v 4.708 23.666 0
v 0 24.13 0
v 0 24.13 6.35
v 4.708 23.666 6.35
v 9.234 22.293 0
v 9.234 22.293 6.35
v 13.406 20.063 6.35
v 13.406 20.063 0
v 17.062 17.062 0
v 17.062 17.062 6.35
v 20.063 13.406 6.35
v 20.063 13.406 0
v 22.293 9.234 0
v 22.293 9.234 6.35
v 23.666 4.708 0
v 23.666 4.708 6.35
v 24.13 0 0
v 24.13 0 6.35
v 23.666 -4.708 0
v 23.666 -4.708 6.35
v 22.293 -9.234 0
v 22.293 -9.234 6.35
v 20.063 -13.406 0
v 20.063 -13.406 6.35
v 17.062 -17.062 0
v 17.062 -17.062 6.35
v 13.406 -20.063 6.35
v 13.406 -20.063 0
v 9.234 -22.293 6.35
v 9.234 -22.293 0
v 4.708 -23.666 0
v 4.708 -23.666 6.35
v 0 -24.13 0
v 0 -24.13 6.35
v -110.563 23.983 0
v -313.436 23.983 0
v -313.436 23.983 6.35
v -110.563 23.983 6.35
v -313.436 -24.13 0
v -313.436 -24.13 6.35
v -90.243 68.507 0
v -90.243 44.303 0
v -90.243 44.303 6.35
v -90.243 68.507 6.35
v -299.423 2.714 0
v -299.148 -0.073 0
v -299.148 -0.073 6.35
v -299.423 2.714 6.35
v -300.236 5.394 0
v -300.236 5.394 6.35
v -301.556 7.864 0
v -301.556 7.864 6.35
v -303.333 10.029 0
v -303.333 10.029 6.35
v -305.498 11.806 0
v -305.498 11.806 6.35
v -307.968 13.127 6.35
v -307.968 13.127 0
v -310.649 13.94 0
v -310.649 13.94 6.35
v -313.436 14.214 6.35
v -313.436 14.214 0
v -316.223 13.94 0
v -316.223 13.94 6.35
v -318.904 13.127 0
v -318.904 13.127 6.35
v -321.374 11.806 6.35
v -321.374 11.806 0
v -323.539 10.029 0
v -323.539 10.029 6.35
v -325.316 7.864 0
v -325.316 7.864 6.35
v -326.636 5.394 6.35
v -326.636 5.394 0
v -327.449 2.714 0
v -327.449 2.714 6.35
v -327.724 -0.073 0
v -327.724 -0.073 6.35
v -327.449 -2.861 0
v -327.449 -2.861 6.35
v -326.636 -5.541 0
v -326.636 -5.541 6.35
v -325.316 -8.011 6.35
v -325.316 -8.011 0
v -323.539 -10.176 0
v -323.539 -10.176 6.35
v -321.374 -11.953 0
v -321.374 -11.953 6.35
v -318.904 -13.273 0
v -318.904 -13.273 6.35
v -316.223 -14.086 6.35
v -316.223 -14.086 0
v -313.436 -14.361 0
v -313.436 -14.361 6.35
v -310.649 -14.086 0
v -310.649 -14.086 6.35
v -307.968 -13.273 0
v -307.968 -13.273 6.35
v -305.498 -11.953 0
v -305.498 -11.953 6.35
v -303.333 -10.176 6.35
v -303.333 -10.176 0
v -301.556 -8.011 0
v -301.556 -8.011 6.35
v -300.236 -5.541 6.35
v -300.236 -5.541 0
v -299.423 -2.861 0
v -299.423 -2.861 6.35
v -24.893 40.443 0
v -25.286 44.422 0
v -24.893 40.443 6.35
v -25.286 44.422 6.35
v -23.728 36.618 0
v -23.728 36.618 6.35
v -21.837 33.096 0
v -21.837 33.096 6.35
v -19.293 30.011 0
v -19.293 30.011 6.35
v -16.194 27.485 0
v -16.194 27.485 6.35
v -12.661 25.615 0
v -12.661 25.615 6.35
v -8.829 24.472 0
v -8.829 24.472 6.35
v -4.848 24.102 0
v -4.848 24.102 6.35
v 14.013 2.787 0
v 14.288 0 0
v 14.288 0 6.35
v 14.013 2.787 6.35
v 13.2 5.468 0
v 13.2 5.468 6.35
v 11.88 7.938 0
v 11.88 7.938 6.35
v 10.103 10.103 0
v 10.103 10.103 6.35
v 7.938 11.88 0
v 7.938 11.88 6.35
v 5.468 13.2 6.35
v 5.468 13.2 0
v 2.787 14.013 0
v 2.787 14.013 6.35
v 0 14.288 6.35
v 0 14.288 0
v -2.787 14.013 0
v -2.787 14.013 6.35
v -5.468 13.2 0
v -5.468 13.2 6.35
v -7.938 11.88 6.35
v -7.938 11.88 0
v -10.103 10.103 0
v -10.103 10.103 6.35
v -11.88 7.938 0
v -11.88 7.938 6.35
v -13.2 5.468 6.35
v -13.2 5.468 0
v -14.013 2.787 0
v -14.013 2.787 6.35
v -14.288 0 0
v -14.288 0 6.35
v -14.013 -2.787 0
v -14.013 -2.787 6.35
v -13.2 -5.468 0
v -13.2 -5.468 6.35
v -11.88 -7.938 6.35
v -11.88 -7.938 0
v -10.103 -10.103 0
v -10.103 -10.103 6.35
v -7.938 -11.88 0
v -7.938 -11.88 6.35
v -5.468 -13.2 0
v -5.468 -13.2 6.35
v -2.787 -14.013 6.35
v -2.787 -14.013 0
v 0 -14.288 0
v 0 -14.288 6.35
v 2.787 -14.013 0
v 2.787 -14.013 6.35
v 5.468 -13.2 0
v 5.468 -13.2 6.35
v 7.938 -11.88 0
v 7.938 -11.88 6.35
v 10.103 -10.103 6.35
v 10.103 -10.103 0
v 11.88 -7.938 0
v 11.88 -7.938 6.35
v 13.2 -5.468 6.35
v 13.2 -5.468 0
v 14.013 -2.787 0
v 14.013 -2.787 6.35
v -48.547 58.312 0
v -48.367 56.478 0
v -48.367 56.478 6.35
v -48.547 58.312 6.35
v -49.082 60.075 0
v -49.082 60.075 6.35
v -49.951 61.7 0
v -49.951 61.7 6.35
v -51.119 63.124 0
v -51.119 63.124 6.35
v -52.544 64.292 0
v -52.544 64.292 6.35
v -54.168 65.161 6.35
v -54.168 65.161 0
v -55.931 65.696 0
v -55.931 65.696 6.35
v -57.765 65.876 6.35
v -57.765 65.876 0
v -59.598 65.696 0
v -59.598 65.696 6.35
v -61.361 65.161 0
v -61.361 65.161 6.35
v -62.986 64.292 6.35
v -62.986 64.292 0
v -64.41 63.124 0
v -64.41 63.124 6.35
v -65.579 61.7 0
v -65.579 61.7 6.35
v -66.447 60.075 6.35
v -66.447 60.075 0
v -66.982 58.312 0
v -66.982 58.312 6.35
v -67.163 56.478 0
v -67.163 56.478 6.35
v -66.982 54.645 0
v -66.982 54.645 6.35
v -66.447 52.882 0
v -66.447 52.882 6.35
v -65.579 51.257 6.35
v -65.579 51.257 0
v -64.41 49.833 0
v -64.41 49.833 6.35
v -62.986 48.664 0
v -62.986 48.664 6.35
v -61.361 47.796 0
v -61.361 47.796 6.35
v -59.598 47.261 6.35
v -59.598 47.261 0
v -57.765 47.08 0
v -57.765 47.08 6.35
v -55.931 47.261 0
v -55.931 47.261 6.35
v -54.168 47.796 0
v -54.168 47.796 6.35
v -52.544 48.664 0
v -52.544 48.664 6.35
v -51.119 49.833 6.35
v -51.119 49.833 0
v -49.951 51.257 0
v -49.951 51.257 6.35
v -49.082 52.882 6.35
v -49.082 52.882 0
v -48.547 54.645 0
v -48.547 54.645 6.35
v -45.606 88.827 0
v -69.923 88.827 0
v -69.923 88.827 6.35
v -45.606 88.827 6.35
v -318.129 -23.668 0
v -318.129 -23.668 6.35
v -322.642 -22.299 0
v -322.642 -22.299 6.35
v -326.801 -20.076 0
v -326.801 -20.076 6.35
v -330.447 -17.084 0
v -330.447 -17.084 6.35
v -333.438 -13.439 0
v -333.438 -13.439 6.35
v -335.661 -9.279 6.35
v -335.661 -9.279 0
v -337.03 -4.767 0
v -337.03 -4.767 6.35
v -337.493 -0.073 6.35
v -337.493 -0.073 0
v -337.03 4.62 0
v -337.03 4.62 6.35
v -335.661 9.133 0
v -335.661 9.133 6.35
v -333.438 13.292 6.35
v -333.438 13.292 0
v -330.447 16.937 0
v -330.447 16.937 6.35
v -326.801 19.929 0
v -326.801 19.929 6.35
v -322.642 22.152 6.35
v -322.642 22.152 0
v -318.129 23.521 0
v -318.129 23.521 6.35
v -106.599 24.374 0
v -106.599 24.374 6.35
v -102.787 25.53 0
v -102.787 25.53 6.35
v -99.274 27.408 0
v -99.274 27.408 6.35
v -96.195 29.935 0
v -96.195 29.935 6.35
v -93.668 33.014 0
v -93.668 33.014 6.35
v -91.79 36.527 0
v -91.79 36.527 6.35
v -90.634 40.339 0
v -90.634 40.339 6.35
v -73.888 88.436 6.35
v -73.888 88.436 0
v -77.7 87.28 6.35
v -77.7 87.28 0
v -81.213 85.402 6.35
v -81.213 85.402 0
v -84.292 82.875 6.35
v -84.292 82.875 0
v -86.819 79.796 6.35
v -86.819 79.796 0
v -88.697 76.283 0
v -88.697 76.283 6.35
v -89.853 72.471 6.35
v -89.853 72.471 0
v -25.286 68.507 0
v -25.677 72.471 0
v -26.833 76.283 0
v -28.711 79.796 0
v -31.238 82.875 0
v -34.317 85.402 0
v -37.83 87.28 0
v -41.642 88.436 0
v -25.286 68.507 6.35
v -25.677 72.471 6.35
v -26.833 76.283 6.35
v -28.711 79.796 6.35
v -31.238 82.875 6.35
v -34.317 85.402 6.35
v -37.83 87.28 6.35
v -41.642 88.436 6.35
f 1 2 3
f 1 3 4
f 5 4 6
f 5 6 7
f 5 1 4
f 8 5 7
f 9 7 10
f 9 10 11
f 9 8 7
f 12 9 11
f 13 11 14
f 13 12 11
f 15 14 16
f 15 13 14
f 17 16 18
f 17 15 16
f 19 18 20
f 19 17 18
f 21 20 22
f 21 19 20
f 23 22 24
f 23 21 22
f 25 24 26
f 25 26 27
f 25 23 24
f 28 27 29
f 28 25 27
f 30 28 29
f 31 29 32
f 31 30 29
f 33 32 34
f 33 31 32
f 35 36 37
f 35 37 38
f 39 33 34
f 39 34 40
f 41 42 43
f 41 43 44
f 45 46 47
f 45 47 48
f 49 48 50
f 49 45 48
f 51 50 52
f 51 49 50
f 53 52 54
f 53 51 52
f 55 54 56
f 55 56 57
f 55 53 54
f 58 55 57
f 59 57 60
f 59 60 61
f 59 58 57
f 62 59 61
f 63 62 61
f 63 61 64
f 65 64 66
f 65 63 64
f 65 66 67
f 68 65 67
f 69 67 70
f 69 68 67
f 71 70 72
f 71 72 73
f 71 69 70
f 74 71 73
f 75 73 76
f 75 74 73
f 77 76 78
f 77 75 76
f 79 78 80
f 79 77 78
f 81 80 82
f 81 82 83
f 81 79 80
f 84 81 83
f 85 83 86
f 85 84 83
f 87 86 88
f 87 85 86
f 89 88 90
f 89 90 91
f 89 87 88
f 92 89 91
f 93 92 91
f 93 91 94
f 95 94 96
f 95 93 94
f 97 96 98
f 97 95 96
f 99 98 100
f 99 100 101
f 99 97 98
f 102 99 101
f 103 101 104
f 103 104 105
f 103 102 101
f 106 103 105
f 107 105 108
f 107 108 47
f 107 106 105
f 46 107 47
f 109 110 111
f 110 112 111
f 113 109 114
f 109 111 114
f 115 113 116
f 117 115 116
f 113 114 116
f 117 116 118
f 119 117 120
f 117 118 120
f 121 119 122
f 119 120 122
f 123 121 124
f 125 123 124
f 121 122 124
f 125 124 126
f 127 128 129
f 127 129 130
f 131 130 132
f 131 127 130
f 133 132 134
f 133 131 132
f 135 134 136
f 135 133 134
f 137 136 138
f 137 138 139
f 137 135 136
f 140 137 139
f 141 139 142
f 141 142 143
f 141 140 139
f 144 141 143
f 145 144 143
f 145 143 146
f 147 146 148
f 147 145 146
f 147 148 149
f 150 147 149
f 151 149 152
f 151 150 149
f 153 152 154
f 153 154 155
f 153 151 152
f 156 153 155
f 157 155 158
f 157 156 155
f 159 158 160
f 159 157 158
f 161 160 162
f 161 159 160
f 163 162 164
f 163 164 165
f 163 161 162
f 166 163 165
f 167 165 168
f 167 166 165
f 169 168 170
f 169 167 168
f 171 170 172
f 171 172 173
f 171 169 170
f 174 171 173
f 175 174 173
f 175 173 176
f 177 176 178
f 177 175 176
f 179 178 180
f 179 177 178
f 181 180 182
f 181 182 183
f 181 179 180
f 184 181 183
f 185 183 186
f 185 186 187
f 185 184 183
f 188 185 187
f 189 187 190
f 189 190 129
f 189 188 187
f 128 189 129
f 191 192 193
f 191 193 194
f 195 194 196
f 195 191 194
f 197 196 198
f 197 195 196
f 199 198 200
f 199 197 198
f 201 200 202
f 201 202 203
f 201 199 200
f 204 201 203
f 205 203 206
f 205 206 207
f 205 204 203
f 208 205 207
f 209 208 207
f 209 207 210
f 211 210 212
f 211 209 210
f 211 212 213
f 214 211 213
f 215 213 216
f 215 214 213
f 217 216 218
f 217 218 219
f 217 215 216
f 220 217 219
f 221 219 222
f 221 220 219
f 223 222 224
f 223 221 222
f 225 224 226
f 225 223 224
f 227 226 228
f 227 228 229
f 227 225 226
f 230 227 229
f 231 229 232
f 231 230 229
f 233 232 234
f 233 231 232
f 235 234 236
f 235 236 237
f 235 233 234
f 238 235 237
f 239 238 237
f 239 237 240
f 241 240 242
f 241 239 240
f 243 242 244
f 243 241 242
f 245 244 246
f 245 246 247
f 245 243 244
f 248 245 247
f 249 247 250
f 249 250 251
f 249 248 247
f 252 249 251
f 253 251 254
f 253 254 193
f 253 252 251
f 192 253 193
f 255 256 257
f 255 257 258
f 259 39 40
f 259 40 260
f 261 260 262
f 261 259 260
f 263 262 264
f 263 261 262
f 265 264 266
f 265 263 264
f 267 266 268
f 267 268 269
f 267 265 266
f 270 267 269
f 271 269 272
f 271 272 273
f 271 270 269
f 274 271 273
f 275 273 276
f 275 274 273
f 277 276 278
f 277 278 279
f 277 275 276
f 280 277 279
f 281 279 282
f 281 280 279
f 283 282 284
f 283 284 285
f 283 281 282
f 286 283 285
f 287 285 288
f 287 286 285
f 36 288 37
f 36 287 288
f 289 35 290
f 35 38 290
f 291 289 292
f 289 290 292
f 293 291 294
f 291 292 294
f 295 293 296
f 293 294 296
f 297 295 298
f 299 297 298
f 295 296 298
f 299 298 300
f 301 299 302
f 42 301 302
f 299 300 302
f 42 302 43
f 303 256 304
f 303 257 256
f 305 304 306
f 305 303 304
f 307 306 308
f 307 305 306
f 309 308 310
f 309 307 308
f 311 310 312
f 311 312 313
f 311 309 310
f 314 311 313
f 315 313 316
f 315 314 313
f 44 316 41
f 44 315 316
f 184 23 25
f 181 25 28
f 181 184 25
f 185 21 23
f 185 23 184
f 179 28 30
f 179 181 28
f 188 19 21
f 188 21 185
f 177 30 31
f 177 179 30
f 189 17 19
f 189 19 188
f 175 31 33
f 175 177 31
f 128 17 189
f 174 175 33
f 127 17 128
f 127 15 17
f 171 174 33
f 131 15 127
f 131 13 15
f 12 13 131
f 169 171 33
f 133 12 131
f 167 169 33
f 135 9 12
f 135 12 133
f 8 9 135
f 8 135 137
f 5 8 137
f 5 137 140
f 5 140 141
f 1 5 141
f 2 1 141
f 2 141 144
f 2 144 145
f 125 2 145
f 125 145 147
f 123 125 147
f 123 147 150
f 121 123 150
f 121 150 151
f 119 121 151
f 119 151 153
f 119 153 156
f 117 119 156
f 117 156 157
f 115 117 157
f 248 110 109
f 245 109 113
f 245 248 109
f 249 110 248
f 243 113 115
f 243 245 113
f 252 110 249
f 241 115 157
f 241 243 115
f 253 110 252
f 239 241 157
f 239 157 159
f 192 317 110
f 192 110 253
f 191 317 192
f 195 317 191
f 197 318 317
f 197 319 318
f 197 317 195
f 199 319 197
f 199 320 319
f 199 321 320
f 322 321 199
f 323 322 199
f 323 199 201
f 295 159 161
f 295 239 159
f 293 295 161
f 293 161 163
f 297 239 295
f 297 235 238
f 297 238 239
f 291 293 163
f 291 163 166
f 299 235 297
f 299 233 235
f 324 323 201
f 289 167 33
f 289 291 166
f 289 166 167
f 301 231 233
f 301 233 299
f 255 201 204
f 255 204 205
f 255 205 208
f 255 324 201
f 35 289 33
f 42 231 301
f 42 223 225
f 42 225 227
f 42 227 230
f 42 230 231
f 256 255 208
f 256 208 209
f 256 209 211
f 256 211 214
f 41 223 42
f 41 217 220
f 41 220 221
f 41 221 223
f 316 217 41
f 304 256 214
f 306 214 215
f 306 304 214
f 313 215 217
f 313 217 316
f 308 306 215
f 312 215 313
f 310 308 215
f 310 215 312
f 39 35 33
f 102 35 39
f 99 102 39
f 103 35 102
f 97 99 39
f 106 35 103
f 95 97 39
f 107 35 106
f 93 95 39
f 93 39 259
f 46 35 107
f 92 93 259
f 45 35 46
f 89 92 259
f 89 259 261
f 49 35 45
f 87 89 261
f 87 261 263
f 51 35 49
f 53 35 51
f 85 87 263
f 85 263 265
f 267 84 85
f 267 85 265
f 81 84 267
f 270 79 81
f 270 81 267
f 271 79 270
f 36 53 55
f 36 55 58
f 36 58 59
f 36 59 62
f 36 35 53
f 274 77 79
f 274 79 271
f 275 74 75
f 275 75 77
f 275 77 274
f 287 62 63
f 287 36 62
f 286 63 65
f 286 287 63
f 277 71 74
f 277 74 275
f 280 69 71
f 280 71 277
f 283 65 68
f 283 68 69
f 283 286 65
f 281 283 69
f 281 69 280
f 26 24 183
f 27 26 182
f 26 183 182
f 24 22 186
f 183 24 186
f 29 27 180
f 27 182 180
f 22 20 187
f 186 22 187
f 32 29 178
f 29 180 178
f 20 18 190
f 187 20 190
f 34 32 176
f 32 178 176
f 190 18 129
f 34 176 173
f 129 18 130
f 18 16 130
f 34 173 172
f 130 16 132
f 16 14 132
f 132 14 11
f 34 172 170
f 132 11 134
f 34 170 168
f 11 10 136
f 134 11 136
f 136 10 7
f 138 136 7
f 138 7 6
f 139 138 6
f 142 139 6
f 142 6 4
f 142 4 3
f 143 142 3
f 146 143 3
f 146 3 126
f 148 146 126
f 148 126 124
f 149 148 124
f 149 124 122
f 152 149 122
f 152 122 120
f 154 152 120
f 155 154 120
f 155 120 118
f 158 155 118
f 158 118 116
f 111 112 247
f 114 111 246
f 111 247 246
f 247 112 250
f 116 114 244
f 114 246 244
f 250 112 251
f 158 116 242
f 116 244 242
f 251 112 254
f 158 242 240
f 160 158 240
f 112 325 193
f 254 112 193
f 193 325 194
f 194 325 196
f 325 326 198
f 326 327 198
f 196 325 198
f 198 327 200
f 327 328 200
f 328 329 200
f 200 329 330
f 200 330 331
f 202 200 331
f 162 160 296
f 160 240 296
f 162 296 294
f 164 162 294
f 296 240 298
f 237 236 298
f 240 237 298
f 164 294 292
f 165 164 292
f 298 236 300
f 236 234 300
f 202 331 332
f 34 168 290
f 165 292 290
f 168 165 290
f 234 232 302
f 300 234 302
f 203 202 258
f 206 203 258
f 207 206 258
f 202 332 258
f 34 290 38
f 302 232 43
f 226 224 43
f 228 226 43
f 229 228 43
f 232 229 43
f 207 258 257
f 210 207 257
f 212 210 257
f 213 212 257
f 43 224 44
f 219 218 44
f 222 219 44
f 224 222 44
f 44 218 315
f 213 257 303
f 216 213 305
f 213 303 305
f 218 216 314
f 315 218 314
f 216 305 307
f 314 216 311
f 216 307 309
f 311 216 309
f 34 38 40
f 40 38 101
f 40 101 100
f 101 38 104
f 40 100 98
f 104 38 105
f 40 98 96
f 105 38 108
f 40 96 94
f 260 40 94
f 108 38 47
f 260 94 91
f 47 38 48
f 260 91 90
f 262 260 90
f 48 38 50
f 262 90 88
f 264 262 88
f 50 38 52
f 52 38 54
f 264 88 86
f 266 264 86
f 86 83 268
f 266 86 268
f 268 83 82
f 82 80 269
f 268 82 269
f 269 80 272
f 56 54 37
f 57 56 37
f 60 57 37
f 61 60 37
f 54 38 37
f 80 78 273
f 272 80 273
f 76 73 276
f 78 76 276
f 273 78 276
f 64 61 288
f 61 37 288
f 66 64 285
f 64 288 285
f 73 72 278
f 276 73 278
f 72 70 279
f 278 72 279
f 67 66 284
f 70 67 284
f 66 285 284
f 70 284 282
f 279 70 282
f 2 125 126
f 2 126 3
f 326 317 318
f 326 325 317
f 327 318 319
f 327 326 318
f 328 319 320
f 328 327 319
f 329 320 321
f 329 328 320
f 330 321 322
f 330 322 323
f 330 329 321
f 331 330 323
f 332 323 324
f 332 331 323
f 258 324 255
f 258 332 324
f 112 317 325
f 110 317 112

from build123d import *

# Parameters (mm, degrees)
SKETCH1_R           = 14.2875
SKETCH1_R_2         = 9.398
BOSS_EXTRUDE1_DEPTH = 6.35
FILLET1_R           = 20.32
FILLET4_R           = 20.32
FILLET5_R           = 20.32
FILLET6_R           = 20.32


with BuildPart() as part:
    # Sketch1 → Boss-Extrude1 (new body)
    with BuildSketch(Plane.XY):
        with BuildLine():
            Line((0, -24.13), (-313.436, -24.13))
            ThreePointArc((-313.436, -24.13), (-337.49260416, -0.07339584), (-313.436, 23.98320832))
            Line((-313.436, 23.98320832), (-90.24339584, 23.98320832))
            Line((-90.24339584, 23.98320832), (-90.24339584, 88.82660416))
            Line((-90.24339584, 88.82660416), (-25.286322176, 88.82660416))
            Line((-25.286322176, 88.82660416), (-25.286322176, 23.98320832))
            Line((-25.286322176, 23.98320832), (0, 24.13))
            ThreePointArc((0, 24.13), (24.13, 0), (0, -24.13))
        make_face()
        with Locations((-313.436, -0.07339584)):
            Circle(SKETCH1_R, mode=Mode.SUBTRACT)
        Circle(SKETCH1_R, mode=Mode.SUBTRACT)
        with Locations((-57.764858946, 56.47830208)):
            Circle(SKETCH1_R_2, mode=Mode.SUBTRACT)
    extrude(amount=BOSS_EXTRUDE1_DEPTH)

    # Fillet1
    fillet1_edges = [part.edges().sort_by_distance(p)[0] for p in [
        (-90.24339584, 23.98320832, 3.175),
    ]]
    fillet(fillet1_edges, radius=FILLET1_R)

    # Fillet4
    fillet4_edges = [part.edges().sort_by_distance(p)[0] for p in [
        (-25.286322176, 23.98320832, 3.175),
    ]]
    fillet(fillet4_edges, radius=FILLET4_R)

    # Fillet5
    fillet5_edges = [part.edges().sort_by_distance(p)[0] for p in [
        (-25.286322176, 88.82660416, 3.175),
    ]]
    fillet(fillet5_edges, radius=FILLET5_R)

    # Fillet6
    fillet6_edges = [part.edges().sort_by_distance(p)[0] for p in [
        (-90.24339584, 88.82660416, 3.175),
    ]]
    fillet(fillet6_edges, radius=FILLET6_R)


solid = part.part
